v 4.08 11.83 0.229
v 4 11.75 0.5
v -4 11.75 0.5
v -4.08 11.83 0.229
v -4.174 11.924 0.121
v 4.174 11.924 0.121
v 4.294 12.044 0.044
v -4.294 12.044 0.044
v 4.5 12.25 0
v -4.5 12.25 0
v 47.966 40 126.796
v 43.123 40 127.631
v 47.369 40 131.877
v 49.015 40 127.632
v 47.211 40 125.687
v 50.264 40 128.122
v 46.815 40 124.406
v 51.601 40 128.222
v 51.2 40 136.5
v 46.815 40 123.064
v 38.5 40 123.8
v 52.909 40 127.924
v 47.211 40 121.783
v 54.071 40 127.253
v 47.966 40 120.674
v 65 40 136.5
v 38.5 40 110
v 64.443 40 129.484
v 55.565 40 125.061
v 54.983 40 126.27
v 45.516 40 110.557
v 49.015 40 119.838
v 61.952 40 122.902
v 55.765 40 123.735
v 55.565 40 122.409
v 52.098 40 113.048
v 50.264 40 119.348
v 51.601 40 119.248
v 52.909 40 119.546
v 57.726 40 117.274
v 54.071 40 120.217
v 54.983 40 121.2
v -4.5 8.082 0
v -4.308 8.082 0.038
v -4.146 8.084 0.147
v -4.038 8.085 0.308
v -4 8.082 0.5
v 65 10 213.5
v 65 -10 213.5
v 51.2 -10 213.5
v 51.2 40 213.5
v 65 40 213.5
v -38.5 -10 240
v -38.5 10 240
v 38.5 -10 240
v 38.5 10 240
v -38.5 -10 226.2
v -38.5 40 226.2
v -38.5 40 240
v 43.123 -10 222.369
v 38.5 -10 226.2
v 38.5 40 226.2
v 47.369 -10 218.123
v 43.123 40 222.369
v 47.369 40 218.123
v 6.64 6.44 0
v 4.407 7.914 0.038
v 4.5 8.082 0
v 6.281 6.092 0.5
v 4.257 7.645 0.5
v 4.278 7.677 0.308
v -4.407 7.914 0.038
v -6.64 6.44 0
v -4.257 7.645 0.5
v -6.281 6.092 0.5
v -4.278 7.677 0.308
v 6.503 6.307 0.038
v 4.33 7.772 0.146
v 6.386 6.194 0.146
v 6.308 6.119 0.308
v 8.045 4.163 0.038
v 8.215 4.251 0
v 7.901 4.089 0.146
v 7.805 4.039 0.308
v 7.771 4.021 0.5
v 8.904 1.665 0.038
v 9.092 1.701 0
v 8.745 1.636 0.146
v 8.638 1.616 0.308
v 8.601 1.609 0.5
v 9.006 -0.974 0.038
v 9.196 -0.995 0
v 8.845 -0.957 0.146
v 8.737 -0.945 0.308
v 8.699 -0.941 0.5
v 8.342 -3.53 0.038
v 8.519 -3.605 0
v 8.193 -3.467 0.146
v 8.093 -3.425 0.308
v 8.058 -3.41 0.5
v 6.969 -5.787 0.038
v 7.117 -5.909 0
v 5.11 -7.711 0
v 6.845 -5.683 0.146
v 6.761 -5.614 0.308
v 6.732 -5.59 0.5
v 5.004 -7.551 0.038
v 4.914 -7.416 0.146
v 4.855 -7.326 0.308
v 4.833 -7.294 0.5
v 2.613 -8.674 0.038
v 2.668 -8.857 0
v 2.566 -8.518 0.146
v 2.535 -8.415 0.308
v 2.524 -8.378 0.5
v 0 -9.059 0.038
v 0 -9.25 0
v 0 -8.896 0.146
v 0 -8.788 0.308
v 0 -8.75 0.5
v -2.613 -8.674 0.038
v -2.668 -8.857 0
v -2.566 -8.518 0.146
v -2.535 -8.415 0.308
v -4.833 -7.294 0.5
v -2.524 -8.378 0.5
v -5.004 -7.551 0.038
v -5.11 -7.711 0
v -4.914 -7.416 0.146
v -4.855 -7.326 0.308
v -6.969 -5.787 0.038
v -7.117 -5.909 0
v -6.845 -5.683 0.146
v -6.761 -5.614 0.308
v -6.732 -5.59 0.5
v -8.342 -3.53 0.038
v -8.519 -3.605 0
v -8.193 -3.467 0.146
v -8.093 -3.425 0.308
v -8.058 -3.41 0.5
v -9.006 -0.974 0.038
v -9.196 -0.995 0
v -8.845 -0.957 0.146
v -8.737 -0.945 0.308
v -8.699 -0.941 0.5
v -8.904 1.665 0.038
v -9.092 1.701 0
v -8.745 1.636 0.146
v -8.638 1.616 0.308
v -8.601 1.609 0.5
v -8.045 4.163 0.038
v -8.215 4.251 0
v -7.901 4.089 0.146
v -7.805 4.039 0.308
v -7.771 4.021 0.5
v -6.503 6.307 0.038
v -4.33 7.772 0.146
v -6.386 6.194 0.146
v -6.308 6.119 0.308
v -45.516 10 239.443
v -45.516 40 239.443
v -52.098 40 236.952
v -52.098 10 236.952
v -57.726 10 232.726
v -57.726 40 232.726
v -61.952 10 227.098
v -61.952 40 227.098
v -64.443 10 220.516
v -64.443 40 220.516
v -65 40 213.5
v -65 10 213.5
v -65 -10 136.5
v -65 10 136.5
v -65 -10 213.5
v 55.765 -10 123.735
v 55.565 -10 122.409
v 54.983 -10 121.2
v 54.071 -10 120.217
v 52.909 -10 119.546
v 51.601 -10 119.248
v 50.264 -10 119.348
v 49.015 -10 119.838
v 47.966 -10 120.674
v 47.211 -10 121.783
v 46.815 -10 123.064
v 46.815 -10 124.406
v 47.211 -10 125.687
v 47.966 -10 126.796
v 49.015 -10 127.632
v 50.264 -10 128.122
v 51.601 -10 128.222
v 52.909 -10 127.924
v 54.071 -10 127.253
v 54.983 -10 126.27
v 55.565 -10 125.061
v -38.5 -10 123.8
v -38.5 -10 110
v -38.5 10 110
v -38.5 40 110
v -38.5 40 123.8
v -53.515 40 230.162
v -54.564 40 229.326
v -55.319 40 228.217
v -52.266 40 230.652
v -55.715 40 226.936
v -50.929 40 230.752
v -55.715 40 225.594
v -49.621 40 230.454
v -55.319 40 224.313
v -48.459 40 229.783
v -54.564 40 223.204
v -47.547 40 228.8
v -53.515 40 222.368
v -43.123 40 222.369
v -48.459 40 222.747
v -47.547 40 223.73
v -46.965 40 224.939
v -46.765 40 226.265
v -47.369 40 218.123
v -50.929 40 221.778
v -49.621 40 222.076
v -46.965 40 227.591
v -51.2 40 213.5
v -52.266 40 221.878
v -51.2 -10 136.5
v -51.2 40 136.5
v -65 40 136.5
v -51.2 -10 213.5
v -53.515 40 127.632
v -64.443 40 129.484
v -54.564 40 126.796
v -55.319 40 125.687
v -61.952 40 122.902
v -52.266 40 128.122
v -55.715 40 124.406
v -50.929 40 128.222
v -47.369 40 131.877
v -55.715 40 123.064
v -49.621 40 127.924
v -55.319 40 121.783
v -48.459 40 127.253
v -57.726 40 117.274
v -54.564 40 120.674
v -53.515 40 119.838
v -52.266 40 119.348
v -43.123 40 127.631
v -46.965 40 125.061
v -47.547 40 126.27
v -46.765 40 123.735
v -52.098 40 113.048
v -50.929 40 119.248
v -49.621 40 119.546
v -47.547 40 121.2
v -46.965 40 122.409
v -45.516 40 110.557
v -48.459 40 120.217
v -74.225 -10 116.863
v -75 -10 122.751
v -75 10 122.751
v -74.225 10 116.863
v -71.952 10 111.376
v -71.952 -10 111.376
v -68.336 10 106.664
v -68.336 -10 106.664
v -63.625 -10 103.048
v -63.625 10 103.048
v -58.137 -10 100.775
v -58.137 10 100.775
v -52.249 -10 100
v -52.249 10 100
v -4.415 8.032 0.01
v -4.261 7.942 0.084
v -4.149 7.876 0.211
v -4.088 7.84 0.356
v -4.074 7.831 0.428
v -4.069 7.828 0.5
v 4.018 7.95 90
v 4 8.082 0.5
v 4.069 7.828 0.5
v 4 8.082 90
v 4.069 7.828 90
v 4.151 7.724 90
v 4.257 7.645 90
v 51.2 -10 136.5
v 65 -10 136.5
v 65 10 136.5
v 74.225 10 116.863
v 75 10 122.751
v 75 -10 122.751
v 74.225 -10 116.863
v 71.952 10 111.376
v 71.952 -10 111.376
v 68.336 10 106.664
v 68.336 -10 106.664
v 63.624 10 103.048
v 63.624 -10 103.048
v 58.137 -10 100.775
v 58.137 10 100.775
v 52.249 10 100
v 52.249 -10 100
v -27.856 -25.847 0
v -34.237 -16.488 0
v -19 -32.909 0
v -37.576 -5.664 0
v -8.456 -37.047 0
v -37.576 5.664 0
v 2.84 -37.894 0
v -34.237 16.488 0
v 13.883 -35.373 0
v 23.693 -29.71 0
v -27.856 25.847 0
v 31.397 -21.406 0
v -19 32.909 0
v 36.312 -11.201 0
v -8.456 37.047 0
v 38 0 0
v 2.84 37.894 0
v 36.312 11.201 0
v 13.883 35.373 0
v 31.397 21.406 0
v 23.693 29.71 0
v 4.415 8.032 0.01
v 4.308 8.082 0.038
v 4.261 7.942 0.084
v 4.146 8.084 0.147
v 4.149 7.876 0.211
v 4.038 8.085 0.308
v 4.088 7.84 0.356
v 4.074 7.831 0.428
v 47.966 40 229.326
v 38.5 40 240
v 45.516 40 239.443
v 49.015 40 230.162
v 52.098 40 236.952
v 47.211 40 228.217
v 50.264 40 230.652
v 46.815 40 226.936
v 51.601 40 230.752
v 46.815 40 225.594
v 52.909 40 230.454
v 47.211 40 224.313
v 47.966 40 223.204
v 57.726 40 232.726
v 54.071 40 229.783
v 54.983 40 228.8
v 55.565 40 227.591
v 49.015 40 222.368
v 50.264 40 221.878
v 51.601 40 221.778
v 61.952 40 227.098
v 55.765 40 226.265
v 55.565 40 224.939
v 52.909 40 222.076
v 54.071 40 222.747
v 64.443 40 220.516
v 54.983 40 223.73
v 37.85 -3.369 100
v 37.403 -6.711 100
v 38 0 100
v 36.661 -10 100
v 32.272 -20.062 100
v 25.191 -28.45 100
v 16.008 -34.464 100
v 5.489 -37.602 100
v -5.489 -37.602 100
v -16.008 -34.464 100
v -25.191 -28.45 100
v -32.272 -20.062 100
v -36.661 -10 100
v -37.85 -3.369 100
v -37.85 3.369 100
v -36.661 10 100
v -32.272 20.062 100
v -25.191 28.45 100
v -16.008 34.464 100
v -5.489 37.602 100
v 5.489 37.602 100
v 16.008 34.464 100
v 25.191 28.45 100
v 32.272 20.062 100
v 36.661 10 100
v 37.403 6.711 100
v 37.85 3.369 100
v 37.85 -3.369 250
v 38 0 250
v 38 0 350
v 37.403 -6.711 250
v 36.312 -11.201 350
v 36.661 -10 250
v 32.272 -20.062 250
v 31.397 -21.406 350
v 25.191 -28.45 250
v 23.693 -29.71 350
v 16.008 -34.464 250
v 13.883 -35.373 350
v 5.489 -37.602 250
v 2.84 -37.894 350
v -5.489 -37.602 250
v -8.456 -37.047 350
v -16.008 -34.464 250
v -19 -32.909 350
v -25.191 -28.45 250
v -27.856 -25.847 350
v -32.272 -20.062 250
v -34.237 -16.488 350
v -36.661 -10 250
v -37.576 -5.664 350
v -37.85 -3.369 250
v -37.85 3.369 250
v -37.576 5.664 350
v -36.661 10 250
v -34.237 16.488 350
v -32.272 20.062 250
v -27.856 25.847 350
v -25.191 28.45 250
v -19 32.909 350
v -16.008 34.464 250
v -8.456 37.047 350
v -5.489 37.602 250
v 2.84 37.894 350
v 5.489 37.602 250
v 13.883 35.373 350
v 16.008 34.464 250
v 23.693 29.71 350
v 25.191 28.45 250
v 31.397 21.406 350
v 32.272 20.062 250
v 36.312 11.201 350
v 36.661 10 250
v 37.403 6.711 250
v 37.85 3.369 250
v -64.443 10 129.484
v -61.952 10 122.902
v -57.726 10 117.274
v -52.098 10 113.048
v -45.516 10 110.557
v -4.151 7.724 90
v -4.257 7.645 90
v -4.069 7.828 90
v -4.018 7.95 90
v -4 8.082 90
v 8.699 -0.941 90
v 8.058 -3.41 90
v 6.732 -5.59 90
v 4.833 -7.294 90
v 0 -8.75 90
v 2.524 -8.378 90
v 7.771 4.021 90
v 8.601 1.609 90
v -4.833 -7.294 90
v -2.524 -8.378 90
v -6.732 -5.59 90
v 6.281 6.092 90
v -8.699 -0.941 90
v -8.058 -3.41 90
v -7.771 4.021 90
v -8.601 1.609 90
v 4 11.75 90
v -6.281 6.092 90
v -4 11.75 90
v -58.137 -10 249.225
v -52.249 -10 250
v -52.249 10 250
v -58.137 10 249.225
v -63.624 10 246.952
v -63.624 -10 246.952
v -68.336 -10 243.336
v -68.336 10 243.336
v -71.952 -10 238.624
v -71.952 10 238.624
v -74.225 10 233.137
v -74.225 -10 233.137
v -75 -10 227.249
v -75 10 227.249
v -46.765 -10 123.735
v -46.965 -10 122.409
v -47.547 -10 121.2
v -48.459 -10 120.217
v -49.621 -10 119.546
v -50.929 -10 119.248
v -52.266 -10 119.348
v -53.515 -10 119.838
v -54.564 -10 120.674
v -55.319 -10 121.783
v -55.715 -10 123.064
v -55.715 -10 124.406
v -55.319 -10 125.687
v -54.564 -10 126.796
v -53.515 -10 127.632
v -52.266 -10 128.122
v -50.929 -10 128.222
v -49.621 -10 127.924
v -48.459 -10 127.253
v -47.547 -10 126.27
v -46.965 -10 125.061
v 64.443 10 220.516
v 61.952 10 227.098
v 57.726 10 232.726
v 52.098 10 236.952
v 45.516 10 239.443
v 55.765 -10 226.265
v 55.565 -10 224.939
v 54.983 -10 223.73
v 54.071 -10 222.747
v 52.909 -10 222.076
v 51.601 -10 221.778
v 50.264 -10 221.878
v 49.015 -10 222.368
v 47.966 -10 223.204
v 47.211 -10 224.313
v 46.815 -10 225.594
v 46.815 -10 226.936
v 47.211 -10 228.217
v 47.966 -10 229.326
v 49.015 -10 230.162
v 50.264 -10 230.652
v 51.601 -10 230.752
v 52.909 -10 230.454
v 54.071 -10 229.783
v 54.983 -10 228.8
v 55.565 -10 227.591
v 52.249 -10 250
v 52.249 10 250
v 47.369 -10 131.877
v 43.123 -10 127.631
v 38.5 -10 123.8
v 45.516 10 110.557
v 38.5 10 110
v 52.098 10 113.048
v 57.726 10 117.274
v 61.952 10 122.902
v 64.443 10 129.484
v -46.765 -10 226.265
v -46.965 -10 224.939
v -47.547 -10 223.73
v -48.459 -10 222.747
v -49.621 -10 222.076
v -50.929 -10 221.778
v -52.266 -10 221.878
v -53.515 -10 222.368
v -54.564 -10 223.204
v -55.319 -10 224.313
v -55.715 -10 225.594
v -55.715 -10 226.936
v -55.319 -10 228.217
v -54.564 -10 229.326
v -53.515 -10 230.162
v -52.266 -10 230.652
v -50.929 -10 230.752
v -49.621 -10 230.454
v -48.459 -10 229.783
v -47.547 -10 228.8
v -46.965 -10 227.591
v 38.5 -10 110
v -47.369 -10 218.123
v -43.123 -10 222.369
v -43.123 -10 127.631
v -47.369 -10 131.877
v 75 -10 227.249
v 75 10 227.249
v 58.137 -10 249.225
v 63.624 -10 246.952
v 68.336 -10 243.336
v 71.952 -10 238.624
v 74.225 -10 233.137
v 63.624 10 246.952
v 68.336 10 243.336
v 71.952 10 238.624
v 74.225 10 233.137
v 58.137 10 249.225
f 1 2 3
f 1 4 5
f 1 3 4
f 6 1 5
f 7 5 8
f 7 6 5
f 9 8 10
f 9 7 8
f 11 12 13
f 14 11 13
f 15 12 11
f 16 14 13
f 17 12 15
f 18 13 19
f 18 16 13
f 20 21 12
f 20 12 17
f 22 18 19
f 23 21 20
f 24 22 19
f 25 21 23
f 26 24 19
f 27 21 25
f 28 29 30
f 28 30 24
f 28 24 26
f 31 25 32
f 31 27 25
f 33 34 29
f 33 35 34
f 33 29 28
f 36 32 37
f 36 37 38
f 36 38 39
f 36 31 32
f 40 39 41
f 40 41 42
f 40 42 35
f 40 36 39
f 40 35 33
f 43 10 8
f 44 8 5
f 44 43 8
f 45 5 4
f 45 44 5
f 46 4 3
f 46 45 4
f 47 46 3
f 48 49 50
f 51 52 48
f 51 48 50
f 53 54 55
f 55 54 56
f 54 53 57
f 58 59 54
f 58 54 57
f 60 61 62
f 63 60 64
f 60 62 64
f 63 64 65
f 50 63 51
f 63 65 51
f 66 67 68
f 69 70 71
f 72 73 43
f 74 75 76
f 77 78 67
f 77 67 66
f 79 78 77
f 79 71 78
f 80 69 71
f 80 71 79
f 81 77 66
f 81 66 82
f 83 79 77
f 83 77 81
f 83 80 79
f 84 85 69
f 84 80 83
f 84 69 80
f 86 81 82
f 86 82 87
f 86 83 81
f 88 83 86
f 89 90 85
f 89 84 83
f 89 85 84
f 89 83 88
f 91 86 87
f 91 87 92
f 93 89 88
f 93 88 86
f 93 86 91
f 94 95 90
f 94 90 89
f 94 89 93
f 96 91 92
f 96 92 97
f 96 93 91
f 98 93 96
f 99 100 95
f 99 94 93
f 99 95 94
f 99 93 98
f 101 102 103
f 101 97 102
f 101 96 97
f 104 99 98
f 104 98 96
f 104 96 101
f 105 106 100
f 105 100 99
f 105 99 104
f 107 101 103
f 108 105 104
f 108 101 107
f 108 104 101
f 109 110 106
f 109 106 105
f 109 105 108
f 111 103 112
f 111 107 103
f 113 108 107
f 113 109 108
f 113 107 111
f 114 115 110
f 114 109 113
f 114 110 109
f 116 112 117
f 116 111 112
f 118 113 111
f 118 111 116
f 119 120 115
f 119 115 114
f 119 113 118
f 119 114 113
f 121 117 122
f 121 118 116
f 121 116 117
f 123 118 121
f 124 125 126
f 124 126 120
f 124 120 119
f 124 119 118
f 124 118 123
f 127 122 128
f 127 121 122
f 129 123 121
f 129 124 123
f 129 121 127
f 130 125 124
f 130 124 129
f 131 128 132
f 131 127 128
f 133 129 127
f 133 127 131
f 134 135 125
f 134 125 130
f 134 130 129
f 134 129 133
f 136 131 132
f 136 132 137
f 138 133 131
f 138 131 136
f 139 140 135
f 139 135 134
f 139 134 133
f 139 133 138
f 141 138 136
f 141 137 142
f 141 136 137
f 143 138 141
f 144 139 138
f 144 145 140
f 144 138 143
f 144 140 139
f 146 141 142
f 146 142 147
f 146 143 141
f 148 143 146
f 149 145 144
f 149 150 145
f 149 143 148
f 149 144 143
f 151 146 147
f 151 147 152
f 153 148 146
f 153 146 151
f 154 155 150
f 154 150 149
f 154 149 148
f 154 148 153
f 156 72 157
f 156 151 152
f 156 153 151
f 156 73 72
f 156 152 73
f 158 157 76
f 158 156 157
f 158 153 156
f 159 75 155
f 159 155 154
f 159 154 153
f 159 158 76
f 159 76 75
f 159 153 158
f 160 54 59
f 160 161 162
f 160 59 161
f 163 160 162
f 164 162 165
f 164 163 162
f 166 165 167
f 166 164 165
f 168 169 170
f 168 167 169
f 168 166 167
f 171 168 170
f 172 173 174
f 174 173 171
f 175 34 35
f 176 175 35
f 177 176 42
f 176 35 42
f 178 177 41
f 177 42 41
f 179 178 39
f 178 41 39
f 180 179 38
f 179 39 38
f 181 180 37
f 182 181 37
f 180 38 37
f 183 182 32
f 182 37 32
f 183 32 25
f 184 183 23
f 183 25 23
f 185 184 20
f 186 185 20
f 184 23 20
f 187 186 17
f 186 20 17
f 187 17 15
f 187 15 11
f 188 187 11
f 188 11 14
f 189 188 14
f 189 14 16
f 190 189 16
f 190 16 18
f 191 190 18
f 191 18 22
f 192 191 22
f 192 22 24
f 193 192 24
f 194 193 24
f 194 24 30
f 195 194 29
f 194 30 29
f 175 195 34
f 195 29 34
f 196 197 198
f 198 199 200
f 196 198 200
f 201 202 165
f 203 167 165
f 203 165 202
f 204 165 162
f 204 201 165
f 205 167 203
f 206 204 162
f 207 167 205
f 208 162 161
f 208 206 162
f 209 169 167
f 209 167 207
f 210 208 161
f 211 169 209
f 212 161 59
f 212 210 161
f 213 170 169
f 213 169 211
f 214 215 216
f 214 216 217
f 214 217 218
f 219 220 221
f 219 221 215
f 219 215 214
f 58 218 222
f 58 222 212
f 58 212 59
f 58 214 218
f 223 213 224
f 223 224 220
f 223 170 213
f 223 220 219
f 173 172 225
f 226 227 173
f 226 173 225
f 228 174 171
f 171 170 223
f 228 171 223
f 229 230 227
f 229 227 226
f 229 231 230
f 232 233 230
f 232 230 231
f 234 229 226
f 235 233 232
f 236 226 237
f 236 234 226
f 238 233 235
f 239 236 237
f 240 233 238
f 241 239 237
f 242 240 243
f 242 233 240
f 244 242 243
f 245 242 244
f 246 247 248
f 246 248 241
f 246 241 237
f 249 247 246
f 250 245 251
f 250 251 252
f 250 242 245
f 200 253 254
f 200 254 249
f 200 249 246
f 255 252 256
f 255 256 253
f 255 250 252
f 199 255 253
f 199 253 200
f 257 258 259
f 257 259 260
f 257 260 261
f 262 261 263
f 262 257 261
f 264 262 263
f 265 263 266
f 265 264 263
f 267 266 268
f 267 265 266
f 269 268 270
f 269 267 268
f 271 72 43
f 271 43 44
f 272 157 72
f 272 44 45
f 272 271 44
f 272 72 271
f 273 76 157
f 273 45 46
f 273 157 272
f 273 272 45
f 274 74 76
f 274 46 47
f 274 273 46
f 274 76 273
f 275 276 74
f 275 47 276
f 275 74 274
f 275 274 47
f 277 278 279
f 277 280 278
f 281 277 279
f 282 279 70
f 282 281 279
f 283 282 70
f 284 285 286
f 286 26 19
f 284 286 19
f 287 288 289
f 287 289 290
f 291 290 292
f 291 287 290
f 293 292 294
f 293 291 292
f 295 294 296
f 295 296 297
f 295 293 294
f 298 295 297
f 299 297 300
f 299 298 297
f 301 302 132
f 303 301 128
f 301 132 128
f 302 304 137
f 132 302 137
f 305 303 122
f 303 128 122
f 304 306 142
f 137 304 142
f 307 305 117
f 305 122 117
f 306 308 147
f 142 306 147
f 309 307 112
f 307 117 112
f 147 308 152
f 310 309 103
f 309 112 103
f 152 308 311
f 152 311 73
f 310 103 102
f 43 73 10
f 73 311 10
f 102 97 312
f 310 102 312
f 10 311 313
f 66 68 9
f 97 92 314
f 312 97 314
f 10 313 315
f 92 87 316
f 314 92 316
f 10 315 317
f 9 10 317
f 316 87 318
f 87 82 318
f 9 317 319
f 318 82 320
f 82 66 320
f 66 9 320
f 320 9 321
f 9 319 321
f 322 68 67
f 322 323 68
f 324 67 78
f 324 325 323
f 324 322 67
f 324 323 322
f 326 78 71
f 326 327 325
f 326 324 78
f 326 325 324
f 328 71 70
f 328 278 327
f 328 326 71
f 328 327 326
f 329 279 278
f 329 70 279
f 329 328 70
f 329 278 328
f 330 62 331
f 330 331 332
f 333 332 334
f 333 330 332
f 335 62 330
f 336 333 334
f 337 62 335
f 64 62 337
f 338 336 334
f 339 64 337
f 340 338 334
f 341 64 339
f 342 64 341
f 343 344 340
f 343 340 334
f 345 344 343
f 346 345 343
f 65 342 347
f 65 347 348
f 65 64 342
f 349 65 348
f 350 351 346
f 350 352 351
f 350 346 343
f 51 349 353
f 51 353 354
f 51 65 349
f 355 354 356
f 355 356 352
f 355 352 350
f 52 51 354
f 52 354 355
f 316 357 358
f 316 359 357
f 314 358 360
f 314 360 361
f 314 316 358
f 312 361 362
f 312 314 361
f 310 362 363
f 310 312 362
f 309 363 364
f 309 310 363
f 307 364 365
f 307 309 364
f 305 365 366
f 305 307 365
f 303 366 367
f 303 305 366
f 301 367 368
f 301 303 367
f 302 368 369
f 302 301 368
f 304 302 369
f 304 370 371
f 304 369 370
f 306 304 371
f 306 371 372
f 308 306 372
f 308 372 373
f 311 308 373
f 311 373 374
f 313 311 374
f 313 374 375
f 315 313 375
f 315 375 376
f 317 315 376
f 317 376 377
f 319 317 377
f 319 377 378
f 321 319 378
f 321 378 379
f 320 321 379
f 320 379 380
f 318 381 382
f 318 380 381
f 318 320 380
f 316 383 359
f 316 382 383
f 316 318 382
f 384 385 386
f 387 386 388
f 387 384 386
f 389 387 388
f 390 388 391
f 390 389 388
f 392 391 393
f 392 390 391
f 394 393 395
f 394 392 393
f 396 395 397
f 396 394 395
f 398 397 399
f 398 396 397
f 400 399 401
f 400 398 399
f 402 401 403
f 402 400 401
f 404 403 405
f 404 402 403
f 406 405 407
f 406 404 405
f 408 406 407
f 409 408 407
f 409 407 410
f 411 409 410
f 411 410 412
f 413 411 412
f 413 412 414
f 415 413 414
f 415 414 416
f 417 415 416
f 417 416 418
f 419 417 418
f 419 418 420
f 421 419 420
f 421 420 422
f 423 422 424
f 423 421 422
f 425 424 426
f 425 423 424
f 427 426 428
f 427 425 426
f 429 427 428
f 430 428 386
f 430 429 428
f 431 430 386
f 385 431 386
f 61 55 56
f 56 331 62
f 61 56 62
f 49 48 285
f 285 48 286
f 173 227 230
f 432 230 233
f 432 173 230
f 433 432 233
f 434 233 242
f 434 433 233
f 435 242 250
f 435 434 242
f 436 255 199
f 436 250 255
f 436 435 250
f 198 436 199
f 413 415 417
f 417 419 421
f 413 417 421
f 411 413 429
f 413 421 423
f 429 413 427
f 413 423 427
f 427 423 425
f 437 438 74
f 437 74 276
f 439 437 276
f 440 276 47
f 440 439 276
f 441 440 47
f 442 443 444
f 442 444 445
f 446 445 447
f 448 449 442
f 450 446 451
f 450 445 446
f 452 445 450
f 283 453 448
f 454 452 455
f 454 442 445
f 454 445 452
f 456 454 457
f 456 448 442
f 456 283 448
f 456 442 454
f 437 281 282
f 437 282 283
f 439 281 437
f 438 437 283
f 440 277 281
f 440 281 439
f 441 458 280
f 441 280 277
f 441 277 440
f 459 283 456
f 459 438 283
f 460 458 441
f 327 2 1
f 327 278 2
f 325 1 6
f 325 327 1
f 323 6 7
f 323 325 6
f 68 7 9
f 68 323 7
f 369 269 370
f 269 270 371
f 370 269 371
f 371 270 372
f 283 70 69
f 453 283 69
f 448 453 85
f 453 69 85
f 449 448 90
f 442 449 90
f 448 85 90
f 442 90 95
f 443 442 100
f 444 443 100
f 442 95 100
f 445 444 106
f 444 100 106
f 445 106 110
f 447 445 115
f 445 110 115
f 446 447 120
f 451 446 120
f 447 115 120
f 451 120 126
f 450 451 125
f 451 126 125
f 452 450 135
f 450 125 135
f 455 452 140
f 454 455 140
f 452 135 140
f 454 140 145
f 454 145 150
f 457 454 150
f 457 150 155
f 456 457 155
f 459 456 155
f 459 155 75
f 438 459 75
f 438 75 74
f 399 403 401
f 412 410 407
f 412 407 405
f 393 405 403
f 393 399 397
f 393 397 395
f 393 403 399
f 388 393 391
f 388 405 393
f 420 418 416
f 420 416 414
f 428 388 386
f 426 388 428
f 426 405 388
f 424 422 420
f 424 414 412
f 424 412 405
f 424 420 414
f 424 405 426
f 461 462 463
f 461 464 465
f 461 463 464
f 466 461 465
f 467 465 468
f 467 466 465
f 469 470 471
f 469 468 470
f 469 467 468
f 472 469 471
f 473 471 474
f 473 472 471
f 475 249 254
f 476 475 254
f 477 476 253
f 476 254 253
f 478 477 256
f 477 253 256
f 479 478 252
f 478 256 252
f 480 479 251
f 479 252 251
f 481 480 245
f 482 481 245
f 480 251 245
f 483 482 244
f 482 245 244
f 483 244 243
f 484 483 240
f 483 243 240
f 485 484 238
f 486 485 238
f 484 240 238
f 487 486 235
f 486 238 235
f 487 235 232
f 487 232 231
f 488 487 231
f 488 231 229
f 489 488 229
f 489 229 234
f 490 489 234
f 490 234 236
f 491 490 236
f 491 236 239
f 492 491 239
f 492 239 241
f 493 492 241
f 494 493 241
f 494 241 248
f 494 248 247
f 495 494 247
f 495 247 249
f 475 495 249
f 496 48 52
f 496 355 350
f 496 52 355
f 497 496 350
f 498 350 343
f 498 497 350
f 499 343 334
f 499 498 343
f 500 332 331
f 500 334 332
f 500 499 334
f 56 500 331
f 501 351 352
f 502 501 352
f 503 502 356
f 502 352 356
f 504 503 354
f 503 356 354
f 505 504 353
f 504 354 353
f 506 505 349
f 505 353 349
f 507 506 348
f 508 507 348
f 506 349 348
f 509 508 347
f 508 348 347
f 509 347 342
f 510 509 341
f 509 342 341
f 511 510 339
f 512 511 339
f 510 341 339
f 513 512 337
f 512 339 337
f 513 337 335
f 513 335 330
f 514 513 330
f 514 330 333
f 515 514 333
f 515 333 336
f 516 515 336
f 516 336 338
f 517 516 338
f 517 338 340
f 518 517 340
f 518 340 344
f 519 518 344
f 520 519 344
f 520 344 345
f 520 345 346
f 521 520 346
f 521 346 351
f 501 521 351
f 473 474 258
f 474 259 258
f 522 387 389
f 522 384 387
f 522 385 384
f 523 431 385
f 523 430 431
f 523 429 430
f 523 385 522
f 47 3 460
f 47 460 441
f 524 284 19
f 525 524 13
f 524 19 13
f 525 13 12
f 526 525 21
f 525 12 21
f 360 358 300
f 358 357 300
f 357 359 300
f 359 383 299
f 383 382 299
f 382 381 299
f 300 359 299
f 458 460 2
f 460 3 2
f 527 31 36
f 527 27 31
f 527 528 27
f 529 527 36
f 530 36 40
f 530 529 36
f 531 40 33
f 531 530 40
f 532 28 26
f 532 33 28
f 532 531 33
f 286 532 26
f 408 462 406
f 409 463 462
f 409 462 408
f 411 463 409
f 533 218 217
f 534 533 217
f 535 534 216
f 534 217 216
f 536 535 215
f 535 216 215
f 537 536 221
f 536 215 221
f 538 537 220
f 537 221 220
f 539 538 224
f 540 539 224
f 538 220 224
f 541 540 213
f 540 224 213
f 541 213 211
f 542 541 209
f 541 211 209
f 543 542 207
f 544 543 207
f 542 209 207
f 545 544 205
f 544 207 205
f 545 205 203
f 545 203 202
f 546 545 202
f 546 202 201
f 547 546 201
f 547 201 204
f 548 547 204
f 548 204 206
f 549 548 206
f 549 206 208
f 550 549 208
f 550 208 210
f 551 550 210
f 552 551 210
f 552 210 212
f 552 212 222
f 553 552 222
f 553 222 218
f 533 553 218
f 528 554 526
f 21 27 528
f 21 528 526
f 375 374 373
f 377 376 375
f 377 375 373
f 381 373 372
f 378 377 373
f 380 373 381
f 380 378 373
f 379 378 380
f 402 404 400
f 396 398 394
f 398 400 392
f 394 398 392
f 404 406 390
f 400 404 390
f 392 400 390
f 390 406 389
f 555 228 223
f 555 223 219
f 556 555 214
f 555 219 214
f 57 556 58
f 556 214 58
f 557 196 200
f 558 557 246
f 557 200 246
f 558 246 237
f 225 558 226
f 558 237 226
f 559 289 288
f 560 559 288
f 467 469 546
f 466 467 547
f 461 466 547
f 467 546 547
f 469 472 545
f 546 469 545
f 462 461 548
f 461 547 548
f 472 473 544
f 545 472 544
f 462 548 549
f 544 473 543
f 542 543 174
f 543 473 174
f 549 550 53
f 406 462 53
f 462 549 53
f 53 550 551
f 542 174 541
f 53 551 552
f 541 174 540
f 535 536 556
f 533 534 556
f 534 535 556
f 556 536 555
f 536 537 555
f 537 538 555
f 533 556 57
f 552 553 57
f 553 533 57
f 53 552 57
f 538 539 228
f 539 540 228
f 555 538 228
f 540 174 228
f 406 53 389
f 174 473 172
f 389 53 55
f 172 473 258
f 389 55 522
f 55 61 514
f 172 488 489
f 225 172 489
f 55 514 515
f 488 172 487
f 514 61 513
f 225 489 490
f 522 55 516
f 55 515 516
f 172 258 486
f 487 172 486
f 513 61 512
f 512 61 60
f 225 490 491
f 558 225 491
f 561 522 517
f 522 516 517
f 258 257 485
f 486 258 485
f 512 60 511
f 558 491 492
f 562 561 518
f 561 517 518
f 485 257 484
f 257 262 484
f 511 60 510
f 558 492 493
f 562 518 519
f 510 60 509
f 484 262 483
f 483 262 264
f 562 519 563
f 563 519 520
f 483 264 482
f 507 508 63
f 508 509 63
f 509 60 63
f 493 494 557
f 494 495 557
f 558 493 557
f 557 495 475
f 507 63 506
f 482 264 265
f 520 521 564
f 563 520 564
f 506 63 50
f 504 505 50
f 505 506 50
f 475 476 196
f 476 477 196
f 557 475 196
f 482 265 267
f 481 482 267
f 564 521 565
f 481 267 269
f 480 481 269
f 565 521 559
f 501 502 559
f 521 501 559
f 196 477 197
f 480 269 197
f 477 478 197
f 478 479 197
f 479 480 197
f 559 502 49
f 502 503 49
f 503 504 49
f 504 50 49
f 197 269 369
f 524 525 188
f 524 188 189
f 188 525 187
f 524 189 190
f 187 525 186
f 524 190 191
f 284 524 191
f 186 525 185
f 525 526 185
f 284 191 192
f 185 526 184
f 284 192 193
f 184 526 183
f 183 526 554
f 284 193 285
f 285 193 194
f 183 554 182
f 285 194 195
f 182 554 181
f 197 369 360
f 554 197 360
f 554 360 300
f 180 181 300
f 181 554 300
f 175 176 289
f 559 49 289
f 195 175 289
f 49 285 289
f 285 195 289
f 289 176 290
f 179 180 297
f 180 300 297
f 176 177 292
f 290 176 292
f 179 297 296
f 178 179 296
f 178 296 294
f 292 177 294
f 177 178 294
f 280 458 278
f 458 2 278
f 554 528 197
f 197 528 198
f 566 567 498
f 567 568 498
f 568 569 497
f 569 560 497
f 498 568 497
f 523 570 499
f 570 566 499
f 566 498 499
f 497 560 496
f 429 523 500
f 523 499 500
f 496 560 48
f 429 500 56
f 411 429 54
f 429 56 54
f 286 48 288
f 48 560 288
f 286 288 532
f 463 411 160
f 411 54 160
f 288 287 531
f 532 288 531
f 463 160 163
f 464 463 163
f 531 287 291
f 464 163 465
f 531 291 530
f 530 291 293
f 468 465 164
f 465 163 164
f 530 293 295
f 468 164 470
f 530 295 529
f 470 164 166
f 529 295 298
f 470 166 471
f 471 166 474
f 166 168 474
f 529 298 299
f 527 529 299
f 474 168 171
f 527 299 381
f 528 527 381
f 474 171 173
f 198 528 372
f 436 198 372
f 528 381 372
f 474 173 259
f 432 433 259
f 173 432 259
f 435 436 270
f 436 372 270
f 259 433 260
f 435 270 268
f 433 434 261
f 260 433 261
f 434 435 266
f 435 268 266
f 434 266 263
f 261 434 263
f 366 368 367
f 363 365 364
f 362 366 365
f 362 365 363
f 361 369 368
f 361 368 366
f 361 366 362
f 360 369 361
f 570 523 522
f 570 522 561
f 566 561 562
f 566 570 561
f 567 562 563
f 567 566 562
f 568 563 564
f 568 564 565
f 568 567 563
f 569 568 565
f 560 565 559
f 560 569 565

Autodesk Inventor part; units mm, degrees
ref_plane "YZ Plane" through (0, 0, 0) normal (1, 0, 0) x (0, 1, 0)
ref_plane "XZ Plane" through (0, 0, 0) normal (0, 1, 0) x (-1, 0, 0)
ref_plane "XY Plane" through (0, 0, 0) normal (0, 0, 1) x (1, 0, 0)
sketch "Sketch1" plane through (0, 0, 0) normal (0, 0, 1) x (1, 0, 0)
  circle A0 centre (0, 0) radius 38
  dimension "d0" = 76
extrude "Extrusion1" add sketch "Sketch1" along normal blind 100
sketch "Sketch2" plane through (0, 0, 0) normal (0, 0, -1) x (-1, 0, 0)
  circle A0 centre (0, 0) radius 8.75
  line L0 (0, 8.75) -> (0, 11.75)
  line L1 (0, 11.75) -> (4, 11.75)
  line L2 (4, 11.75) -> (-4, 11.75)
  line L3 (-4, 11.75) -> (-4, 7.7822)
  line L4 (4, 11.75) -> (4, 7.7822)
  dimension "d3" = 17.5
  dimension "d5" = 3
  dimension "d6" = 4
  dimension "d7" = 8
  dimension "d8" = 3.9678
  dimension "d9" = 3.9678
extrude "Extrusion2" cut sketch "Sketch2" against normal blind 90
fillet "Fillet1" radius 0.5 4 edges at (4, 9.7661, 0) (0, 11.75, 0) (-4, 9.7661, 0) (0, -8.75, 0)
fillet "Fillet2" radius 0.5 4 edges at (-4, 7.7822, 45.25) (-4.1498, 7.8731, 0.1431) (4, 7.7822, 45.25) (4.1498, 7.8731, 0.1431)
sketch "Sketch5" plane through (0, 0, 100) normal (0, 0, 1) x (1, 0, 0)
  line L0 (-75, -10) -> (75, -10)
  line L1 (75, -10) -> (75, 10)
  line L2 (75, 10) -> (-75, 10)
  line L3 (-75, 10) -> (-75, -10)
  line L4 (-75, -10) -> (75, 10) construction
  line L5 (75, -10) -> (-75, 10) construction
  point P0 (0, 0)
  dimension "d32" = 150
  dimension "d33" = 20
extrude "Extrusion5" add sketch "Sketch5" along normal blind 150
fillet "Fillet6" radius 22.751 4 edges at (-75, 0, 250) (75, 0, 250) (75, 0, 100) (-75, 0, 100)
sketch "Sketch8" plane through (0, 0, 250) normal (0, 0, 1) x (1, 0, 0)
  circle A0 centre (0, 0) radius 38
extrude "Extrusion8" add sketch "Sketch8" along normal blind 100
sketch "Sketch11" plane through (-36.6606, 10, 100) normal (0, 1, 0) x (1, 0, 0)
  line L0 (-28.3394, -140) -> (101.6606, -140)
  line L1 (101.6606, -140) -> (101.6606, -10)
  line L2 (101.6606, -10) -> (-28.3394, -10)
  line L3 (-28.3394, -10) -> (-28.3394, -140)
  line L4 (-28.3394, -140) -> (101.6606, -10) construction
  line L5 (101.6606, -140) -> (-28.3394, -10) construction
  line L6 (-38.3394, -22.751) -> (-38.3394, -127.249) projected
  line L7 (0, -150) -> (73.3212, -150) projected
  line L8 (-38.3394, -127.249) -> (-28.3394, -127.249)
  line L9 (-15.5884, -150) -> (0, -150) projected
  line L10 (-15.5884, -150) -> (-15.5884, -140)
  line L11 (-38.3394, -22.751) -> (-38.3394, -127.249) projected
  line L12 (-38.3394, -22.751) -> (-28.3394, -22.751)
  arc A0 (-15.5884, 0) -> (-38.3394, -22.751) centre (-15.5884, -22.751) ccw projected
  line L13 (-15.5884, 0) -> (-15.5884, -10)
  line L14 (88.9096, 0) -> (73.3212, 0) projected
  line L15 (88.9096, 0) -> (88.9096, -10)
  arc A1 (111.6606, -22.751) -> (88.9096, 0) centre (88.9096, -22.751) ccw projected
  line L16 (111.6606, -22.751) -> (101.6606, -22.751)
  line L17 (73.3212, -150) -> (88.9096, -150) projected
  line L18 (88.9096, -150) -> (88.9096, -140)
  line L19 (111.6606, -22.751) -> (111.6606, -127.249) projected
  line L20 (111.6606, -127.249) -> (101.6606, -127.249)
  line L21 (-28.3394, -75) -> (-28.3394, -36.5)
  line L22 (-28.3394, -75) -> (-28.3394, -113.5)
  line L23 (-28.3394, -36.5) -> (-14.5394, -36.5)
  line L24 (36.6606, -10) -> (-1.8394, -10)
  line L25 (36.6606, -10) -> (75.1606, -10)
  line L26 (-1.8394, -10) -> (-1.8394, -23.8)
  arc A2 (-1.8394, -23.8) -> (-14.5394, -36.5) centre (36.832, -75.1714) ccw
  line L27 (36.6606, -140) -> (-1.8394, -140)
  line L28 (36.6606, -140) -> (75.1606, -140)
  line L29 (101.6606, -75) -> (101.6606, -113.5)
  line L30 (101.6606, -75) -> (101.6606, -36.5)
  line L31 (36.6606, -10) -> (75.1606, -10)
  line L32 (-28.3394, -113.5) -> (-14.5394, -113.5)
  line L33 (-1.8394, -140) -> (-1.8394, -126.2)
  line L34 (75.1606, -140) -> (75.1606, -126.2)
  line L35 (101.6606, -113.5) -> (87.8606, -113.5)
  line L36 (101.6606, -36.5) -> (87.8606, -36.5)
  line L37 (75.1606, -10) -> (75.1606, -23.8)
  arc A3 (75.1606, -126.2) -> (87.8606, -113.5) centre (36.4892, -74.8286) ccw
  arc A4 (-14.5394, -113.5) -> (-1.8394, -126.2) centre (36.832, -74.8286) ccw
  arc A5 (87.8606, -36.5) -> (75.1606, -23.8) centre (36.4892, -75.1714) ccw
  point P0 (36.6606, 100)
  point P1 (36.6606, -75)
  dimension "d72" = 130
  dimension "d73" = 130
  dimension "d74" = 75
  dimension "d75" = 75
  dimension "d84" = 38.5
  dimension "d85" = 38.5
  dimension "d86" = 13.8
  dimension "d87" = 38.5
  dimension "d88" = 38.5
  dimension "d89" = 13.8
  dimension "d90" = 64.3
  dimension "d96" = 38.5
  dimension "d97" = 38.5
  dimension "d98" = 38.5
  dimension "d99" = 38.5
  dimension "d100" = 13.8
  dimension "d101" = 13.8
  dimension "d102" = 13.8
  dimension "d103" = 13.8
  dimension "d104" = 13.8
  dimension "d105" = 13.8
  dimension "d106" = 64.3
  dimension "d107" = 64.3
  dimension "d108" = 64.3
extrude "Extrusion10" cut sketch "Sketch11" against normal blind 20 contours L33 A4 L32 L3 L23 A2 L26 L2 L37 A5 L36 L1 L35 A3 L34 L0
sketch "Sketch12" plane through (-36.6606, 10, 100) normal (0, 1, 0) x (1, 0, 0)
  circle A0 centre (-14.6044, -23.735) radius 4.5
  line L0 (-28.3394, -36.5) -> (-14.5394, -36.5) projected
  line L1 (-28.3394, -113.5) -> (-28.3394, -36.5) projected
  circle A1 centre (-14.6044, -126.265) radius 4.5
  circle A2 centre (87.9256, -126.265) radius 4.5
  circle A3 centre (87.9256, -23.735) radius 4.5
  line L2 (-14.5394, -113.5) -> (-28.3394, -113.5) projected
  line L3 (101.6606, -113.5) -> (87.8606, -113.5) projected
  line L4 (101.6606, -36.5) -> (101.6606, -113.5) projected
  line L5 (87.8606, -36.5) -> (101.6606, -36.5) projected
  point P0 (36.6606, 100)
  point P1 (-28.3394, -127.249)
  dimension "d91" = 9
  dimension "d92" = 12.765
  dimension "d93" = 13.735
  dimension "d109" = 9
  dimension "d110" = 9
  dimension "d111" = 9
  dimension "d112" = 12.765
  dimension "d113" = 13.735
  dimension "d114" = 12.765
  dimension "d115" = 13.735
  dimension "d116" = 13.735
  dimension "d117" = 12.765
extrude "Extrusion11" cut sketch "Sketch12" along normal mid plane 50
sketch "Sketch13" plane through (-36.6606, 10, 100) normal (0, 1, 0) x (1, 0, 0)
  line L0 (-28.3394, -113.5) -> (-28.3394, -36.5) projected
  line L1 (75.1606, -140) -> (-1.8394, -140) projected
  arc A0 (-28.3394, -113.5) -> (-1.8394, -140) centre (-3.3874, -115.048) ccw
  line L2 (-1.8394, -10) -> (-1.8394, -23.8) projected
  arc A1 (-1.8394, -10) -> (-28.3394, -36.5) centre (-3.3874, -34.952) ccw
  line L3 (101.6606, -113.5) -> (101.6606, -36.5) projected
  arc A2 (75.1606, -140) -> (101.6606, -113.5) centre (76.7086, -115.048) ccw
  line L4 (101.6606, -36.5) -> (87.8606, -36.5) projected
  line L5 (75.1606, -23.8) -> (75.1606, -10) projected
  arc A3 (101.6606, -36.5) -> (75.1606, -10) centre (76.7086, -34.952) ccw
  line L6 (-1.8394, -126.2) -> (-1.8394, -140) projected
  line L7 (-1.8394, -140) -> (-1.8394, -126.2)
  arc A4 (-14.5394, -113.5) -> (-1.8394, -126.2) centre (36.832, -74.8286) ccw projected
  line L8 (-28.3394, -113.5) -> (-14.5394, -113.5)
  arc A5 (-14.5394, -113.5) -> (-1.8394, -126.2) centre (36.832, -74.8286) ccw
  line L9 (-14.5394, -36.5) -> (-28.3394, -36.5) projected
  line L10 (-28.3394, -36.5) -> (-14.5394, -36.5)
  line L11 (-1.8394, -10) -> (-1.8394, -23.8)
  line L12 (75.1606, -10) -> (75.1606, -23.8)
  line L13 (87.8606, -36.5) -> (101.6606, -36.5)
  line L14 (101.6606, -113.5) -> (87.8606, -113.5) projected
  line L15 (87.8606, -113.5) -> (101.6606, -113.5)
  arc A6 (-1.8394, -23.8) -> (-14.5394, -36.5) centre (36.832, -75.1714) ccw projected
  arc A7 (-1.8394, -23.8) -> (-14.5394, -36.5) centre (36.832, -75.1714) ccw
  arc A8 (87.8606, -36.5) -> (75.1606, -23.8) centre (36.4892, -75.1714) ccw
  line L16 (75.1606, -140) -> (75.1606, -126.2) projected
  line L17 (75.1606, -140) -> (75.1606, -126.2)
  arc A9 (75.1606, -126.2) -> (87.8606, -113.5) centre (36.4892, -74.8286) ccw projected
  arc A10 (75.1606, -126.2) -> (87.8606, -113.5) centre (36.4892, -74.8286) ccw
  point P0 (36.6606, 100)
  dimension "d118" = 25
  dimension "d119" = 25
  dimension "d120" = 25
  dimension "d121" = 25
  dimension "d122" = 64.3
  dimension "d125" = 64.3
  dimension "d126" = 64.3
  dimension "d127" = 64.3
extrude "Extrusion12" add sketch "Sketch13" along normal blind 30
sketch "Sketch14" plane through (-36.6606, -10, 100) normal (0, -1, 0) x (1, 0, 0)
  circle A0 centre (-14.6044, 23.735) radius 4.5 projected
  circle A1 centre (-14.6044, 23.735) radius 4.5
  circle A2 centre (-14.6044, 126.265) radius 4.5 projected
  circle A3 centre (-14.6044, 126.265) radius 4.5
  circle A4 centre (87.9256, 126.265) radius 4.5 projected
  circle A5 centre (87.9256, 126.265) radius 4.5
  circle A6 centre (87.9256, 23.735) radius 4.5 projected
  circle A7 centre (87.9256, 23.735) radius 4.5
  point P0 (36.6606, -100)
  dimension "d130" = 9
  dimension "d131" = 9
  dimension "d132" = 9
  dimension "d133" = 9
extrude "Extrusion13" cut sketch "Sketch14" against normal blind 100
equation "\"d112\" = d92"
equation "\"d113\" = d93"
equation "\"d114\" = d112"
equation "\"d115\" = d113"
equation "\"d116\" = d115"
equation "\"d117\" = d114"
properties part number "FrontPlateV2"
